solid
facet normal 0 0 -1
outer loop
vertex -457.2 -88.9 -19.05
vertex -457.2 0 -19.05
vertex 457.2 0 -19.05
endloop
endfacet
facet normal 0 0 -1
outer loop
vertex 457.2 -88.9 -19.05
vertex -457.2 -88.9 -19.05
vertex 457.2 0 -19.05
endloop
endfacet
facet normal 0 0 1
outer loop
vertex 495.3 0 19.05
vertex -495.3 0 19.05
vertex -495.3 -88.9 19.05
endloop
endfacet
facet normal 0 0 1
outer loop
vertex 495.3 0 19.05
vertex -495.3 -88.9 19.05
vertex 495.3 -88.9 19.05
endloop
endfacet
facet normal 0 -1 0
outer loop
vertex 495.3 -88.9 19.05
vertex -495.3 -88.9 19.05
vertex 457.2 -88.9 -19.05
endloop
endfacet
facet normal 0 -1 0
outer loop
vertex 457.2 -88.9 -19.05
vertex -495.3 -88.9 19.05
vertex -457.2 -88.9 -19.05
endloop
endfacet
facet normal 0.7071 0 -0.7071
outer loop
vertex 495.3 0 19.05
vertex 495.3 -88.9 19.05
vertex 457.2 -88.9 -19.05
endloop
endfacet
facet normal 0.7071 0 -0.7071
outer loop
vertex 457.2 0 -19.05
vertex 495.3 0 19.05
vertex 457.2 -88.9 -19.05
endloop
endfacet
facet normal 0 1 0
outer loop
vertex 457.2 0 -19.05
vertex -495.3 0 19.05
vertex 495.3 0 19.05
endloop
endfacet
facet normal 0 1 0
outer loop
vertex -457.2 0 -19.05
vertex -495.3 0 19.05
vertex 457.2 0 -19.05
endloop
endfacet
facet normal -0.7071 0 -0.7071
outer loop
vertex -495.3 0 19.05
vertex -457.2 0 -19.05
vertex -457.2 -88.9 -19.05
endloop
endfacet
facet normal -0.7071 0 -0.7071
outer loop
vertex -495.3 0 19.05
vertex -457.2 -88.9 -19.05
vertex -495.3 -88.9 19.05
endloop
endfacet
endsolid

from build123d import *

# Parameters (mm, degrees)
F0_W     = 990.6
F0_H     = 38.1
F1_DEPTH = 88.9
F3_DEPTH = 88.901
F5_DEPTH = 88.901


with BuildPart() as f1:
    # F0 (on Front) → F1 (new body)
    with BuildSketch(Plane.XZ):
        Rectangle(F0_W, F0_H)
    extrude(amount=F1_DEPTH)

    # F2 (on face) → F3 (cut, through all)
    with BuildSketch(Plane.XZ.offset(88.9)):
        Polygon((-457.2, -19.05), (-495.3, 19.05), (-495.3, -19.05), align=None)
    extrude(amount=-F3_DEPTH, mode=Mode.SUBTRACT)

    # F4 (on Front) → F5 (cut, through all)
    with BuildSketch(Plane.XZ):
        Polygon((495.3, -19.05), (495.3, 19.05), (457.2, -19.05), align=None)
    extrude(amount=F5_DEPTH, mode=Mode.SUBTRACT)


solid = f1.part
